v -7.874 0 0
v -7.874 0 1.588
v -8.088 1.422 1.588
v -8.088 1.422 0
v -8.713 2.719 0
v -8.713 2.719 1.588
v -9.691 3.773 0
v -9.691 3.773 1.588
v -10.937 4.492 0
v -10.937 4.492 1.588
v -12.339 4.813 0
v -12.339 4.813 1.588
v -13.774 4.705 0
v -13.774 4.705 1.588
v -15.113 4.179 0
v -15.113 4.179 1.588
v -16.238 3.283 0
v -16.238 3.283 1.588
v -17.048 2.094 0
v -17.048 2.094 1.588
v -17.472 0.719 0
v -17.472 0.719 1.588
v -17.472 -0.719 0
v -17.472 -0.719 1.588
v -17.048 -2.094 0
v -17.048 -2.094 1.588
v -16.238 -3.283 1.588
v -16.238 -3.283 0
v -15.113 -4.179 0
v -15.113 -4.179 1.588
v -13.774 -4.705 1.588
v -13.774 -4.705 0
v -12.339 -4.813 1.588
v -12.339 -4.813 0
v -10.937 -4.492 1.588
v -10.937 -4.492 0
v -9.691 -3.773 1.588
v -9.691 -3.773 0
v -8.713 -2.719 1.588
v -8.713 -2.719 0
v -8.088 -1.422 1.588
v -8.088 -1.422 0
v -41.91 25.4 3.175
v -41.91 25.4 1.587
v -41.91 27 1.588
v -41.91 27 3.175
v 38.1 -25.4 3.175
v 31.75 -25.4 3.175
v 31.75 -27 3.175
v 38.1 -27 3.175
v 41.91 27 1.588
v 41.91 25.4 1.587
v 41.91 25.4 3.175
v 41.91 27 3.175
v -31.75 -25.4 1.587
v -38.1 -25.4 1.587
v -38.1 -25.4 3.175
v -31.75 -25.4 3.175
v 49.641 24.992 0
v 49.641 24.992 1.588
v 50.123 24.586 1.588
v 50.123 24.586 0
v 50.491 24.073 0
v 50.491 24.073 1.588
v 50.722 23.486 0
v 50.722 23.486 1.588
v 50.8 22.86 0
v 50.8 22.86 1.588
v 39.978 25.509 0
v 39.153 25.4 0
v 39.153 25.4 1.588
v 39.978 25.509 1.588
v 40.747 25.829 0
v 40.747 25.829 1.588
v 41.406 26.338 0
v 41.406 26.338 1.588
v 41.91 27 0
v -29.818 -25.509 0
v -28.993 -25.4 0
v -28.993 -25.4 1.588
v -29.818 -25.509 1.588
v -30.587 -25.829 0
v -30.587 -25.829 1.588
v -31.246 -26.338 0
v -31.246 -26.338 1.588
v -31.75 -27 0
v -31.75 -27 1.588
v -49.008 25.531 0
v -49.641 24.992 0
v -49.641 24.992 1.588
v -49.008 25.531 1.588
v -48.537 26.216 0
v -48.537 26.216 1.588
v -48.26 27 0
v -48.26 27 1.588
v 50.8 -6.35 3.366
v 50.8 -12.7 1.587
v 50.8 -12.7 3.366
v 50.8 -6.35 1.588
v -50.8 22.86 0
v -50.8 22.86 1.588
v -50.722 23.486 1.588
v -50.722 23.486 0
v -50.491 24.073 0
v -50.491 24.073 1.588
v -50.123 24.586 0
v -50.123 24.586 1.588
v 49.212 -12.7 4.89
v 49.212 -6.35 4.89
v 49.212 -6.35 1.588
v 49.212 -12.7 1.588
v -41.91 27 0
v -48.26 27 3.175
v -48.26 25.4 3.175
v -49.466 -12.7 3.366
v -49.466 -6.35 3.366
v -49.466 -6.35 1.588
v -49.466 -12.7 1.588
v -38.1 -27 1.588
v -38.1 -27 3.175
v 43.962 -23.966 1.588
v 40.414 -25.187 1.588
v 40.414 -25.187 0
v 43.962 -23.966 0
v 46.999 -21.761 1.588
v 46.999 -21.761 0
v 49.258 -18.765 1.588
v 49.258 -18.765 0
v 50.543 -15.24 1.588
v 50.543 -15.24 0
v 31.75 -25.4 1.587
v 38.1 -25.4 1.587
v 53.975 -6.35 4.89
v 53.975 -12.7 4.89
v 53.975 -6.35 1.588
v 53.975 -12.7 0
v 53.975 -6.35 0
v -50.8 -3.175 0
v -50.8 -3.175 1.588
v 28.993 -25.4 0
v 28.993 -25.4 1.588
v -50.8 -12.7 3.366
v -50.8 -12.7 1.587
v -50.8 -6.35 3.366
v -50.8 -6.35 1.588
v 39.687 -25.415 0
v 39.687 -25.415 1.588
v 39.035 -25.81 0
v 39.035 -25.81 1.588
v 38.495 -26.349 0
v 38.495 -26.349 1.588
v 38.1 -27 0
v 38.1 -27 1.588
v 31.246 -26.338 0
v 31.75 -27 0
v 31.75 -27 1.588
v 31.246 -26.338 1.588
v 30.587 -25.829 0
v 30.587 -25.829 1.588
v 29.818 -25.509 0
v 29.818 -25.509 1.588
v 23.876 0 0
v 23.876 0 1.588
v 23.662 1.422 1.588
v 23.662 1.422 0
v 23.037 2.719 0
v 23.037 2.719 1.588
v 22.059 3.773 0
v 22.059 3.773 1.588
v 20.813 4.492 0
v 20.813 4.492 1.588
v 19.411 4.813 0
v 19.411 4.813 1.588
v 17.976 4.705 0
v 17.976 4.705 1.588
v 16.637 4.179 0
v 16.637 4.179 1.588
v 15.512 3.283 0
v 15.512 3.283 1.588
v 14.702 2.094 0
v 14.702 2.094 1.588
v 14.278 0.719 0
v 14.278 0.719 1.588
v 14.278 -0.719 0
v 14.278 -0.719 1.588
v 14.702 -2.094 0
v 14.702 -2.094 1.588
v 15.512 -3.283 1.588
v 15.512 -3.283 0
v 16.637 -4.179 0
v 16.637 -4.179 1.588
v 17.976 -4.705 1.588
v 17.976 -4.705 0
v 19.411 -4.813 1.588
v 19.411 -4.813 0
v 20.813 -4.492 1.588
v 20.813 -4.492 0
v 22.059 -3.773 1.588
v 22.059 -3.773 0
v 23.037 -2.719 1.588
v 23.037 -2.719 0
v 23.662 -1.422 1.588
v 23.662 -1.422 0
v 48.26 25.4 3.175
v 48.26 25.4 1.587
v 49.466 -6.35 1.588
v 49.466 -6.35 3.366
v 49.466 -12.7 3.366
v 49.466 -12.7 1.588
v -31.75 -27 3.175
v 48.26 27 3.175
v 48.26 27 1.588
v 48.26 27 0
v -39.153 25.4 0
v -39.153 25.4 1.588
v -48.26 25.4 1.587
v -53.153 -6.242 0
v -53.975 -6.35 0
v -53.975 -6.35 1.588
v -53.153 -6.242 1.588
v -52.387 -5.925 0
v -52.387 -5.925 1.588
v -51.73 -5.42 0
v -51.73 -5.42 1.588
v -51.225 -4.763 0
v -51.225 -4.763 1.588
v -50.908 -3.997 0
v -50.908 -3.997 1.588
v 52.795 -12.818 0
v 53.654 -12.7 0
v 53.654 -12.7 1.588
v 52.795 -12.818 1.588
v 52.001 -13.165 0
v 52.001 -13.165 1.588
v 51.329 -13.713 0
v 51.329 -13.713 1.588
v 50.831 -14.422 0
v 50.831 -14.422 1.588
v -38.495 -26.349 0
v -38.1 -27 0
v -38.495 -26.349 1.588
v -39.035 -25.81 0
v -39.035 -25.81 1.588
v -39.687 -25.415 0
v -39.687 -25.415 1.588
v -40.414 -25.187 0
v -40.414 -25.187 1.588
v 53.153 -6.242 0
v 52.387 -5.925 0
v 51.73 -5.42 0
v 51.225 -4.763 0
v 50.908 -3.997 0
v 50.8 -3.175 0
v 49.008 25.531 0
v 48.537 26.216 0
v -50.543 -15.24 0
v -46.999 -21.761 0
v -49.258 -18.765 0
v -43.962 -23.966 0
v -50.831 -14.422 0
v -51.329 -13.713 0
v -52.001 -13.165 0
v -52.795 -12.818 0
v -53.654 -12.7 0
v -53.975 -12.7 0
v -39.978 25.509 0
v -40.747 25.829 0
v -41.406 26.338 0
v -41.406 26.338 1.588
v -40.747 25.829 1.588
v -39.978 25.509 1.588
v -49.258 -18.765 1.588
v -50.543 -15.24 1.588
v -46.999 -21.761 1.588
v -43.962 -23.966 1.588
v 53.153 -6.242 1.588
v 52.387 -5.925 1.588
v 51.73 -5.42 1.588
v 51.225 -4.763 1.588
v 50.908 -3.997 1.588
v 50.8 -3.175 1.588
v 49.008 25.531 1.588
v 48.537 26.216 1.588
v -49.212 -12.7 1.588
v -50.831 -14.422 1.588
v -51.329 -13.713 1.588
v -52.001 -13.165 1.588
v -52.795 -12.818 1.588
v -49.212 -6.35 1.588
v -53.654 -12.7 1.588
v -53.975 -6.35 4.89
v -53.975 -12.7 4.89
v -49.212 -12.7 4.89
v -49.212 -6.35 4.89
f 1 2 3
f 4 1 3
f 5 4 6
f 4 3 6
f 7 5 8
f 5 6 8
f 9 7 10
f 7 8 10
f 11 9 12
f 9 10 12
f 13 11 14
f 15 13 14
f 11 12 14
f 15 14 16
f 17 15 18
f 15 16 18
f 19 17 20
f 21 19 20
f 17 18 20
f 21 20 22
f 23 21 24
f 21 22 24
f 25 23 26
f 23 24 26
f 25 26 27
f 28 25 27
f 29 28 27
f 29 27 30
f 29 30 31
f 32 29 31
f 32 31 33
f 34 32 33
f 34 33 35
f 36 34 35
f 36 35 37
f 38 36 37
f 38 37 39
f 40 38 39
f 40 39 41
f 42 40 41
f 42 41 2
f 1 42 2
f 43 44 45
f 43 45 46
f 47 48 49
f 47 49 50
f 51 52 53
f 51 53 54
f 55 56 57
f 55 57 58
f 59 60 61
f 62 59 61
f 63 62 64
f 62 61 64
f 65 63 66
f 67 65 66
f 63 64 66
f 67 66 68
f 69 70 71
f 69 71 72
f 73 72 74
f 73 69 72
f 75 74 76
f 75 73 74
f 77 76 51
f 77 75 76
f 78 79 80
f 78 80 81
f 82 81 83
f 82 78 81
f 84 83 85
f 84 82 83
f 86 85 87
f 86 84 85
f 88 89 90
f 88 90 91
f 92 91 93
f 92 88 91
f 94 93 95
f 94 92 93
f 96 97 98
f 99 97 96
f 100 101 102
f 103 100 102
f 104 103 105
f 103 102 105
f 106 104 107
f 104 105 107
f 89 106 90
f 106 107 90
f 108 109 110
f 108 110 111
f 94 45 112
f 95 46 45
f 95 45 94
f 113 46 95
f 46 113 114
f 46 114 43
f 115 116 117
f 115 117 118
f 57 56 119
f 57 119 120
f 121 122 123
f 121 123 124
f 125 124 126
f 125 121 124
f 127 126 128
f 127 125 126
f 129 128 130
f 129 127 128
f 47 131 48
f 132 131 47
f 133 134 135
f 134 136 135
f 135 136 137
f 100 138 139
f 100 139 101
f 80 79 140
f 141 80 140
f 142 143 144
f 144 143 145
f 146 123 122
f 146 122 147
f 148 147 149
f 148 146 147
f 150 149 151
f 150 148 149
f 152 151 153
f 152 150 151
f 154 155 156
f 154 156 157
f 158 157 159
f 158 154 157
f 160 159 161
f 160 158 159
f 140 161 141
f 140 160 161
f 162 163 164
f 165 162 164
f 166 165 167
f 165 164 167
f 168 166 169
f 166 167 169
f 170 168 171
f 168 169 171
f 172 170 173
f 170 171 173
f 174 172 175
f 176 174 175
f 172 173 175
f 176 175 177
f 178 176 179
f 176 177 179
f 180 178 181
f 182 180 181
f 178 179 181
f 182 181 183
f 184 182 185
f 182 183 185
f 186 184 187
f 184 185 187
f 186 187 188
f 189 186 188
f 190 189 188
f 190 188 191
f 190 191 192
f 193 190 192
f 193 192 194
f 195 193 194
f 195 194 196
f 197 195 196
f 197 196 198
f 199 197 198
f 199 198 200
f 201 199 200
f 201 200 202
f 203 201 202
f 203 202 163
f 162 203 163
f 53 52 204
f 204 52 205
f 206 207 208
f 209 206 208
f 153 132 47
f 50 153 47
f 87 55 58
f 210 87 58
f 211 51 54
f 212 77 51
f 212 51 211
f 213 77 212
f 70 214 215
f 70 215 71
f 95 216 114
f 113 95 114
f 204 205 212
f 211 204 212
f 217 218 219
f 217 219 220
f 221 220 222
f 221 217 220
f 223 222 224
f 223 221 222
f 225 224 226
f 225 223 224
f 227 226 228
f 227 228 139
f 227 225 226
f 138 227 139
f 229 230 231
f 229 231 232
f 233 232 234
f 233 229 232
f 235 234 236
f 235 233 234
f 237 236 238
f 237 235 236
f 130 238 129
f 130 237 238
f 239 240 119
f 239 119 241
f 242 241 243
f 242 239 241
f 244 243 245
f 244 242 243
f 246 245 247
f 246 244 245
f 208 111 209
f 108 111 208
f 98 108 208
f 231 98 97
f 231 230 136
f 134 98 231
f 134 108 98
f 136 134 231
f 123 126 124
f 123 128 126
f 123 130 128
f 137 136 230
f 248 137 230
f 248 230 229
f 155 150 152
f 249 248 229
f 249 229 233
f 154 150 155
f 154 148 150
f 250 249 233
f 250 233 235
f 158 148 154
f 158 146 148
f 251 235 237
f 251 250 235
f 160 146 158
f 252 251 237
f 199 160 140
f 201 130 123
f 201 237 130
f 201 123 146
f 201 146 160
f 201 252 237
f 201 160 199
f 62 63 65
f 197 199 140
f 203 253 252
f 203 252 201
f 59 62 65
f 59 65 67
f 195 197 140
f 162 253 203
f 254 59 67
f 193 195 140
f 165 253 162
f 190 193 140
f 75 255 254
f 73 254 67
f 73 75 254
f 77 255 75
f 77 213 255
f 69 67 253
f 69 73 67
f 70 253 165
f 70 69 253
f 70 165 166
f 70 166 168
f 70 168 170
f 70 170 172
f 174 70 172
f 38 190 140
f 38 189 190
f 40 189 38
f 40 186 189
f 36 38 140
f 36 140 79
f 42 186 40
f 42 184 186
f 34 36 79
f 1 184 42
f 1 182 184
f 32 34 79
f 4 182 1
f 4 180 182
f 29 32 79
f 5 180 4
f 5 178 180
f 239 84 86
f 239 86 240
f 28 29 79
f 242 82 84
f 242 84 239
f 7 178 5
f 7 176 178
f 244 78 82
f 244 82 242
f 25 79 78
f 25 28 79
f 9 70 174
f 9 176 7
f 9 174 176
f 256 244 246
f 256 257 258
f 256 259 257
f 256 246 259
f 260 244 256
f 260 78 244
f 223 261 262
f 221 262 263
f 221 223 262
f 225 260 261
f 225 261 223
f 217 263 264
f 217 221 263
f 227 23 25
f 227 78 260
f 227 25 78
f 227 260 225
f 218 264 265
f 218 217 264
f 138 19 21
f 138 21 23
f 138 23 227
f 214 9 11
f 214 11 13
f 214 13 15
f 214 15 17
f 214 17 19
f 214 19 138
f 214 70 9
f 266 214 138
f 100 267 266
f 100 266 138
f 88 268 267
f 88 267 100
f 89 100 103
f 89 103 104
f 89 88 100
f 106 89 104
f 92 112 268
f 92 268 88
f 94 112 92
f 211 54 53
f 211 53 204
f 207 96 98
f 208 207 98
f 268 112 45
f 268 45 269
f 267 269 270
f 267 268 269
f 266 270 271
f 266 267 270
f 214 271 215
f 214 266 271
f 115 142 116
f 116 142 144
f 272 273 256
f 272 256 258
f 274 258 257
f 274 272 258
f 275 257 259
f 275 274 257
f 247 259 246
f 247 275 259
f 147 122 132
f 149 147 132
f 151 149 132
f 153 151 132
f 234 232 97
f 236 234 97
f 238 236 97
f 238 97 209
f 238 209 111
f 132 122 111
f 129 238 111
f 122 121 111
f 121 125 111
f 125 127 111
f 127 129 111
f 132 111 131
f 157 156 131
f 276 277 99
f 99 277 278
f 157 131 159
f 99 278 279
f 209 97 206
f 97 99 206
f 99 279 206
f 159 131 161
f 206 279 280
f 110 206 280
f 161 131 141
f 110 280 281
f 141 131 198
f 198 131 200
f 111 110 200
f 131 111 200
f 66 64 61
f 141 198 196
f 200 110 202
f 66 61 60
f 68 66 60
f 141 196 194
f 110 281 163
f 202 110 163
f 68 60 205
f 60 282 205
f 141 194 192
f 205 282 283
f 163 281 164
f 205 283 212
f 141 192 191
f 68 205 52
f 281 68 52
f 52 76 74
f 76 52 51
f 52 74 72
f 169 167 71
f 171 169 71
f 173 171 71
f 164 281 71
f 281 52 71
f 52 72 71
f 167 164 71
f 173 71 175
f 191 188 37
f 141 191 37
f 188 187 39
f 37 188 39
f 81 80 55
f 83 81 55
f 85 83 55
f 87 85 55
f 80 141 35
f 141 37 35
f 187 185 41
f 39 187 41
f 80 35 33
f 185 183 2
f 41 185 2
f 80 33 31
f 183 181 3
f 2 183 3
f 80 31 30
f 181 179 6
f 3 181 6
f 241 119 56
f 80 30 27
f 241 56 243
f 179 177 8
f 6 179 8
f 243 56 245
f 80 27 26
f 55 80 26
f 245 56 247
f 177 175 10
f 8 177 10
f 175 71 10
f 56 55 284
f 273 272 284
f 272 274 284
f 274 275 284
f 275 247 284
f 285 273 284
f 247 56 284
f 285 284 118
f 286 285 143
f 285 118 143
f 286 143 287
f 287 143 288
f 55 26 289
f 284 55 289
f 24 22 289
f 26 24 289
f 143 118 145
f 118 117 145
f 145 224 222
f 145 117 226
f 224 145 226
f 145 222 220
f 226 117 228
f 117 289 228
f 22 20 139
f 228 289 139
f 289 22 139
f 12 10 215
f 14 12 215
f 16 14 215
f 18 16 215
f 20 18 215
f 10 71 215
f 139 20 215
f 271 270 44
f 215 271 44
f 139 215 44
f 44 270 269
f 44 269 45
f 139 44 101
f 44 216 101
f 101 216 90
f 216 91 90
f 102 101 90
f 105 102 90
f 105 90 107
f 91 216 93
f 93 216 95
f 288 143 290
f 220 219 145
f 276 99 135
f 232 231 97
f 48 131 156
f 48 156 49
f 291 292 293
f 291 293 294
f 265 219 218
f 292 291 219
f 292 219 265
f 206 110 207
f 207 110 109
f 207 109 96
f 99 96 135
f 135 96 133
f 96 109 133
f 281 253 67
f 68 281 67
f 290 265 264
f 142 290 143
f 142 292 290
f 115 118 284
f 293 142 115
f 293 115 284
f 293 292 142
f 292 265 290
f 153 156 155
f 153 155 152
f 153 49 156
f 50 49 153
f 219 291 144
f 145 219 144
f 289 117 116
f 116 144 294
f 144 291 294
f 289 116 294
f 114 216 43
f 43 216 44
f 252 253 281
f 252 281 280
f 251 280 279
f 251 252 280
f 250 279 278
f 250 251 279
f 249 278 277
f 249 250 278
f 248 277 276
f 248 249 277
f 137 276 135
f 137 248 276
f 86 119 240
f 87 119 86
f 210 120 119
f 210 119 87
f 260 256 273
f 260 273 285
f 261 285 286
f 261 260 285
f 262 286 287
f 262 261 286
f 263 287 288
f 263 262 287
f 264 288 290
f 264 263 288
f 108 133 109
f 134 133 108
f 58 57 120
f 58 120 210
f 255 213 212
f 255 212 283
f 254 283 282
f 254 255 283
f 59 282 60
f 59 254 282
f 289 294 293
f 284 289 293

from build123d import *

# Parameters (mm, degrees)
F0_W         = 101.6
F0_H         = 50.8
F0_R         = 1.905
F1_DEPTH     = 1.5875
F3_R         = 12.7
F4_R         = 2.54
F2_R         = 4.826
F2_R_2       = 1.905
F5_DEPTH     = 3.175
F6_W         = 6.35
F6_H         = 1.5875
F7_DEPTH     = 1.6002
F8_W         = 6.35
F8_H         = 1.5875
F9_DEPTH     = 1.6002
F10_W        = 6.35
F10_H        = 1.5875
F11_DEPTH    = 3.175
F12_W        = 6.35
F12_H        = 1.5875
F13_DEPTH    = 3.175
F14_W        = 6.35
F14_H        = 1.6002
F15_DEPTH    = 1.5875
F14_W_2      = 3.175
F14_H_2      = 6.35
F16_DEPTH    = 3.302
F17_W        = 6.35
F17_H        = 1.524
F18_DEPTH    = 1.5875
F19_W        = 6.35
F19_H        = 1.524
F20_DEPTH    = 1.5875
F21_T1_DEPTH = 1.5875
F22_W        = 0.254
F22_H        = 6.35
F23_DEPTH    = 2.032
F24_W        = 0.254
F24_H        = 6.35
F25_DEPTH    = 2.032


# Not quite as in the source:
# - a fillet or chamfer that OpenCascade refuses, or shapes differently, is made with other operations: its cross-section is extruded or revolved along the edge and cut away or added


with BuildPart() as f1:
    # F0 (on Top) → F1 (new body)
    with BuildSketch(Plane.XY):
        Rectangle(F0_W, F0_H)
        with Locations((-12.7, 0)):
            Circle(F0_R, mode=Mode.SUBTRACT)
        with Locations((19.05, 0)):
            Circle(F0_R, mode=Mode.SUBTRACT)
    extrude(amount=F1_DEPTH)

    # F3
    f3_edges = [f1.edges().sort_by_distance(p)[0] for p in [
        (-50.8, -25.4, 0.79375),
        (50.8, -25.4, 0.79375),
    ]]
    fillet(f3_edges, radius=F3_R)

    # F4
    f4_edges = [f1.edges().sort_by_distance(p)[0] for p in [
        (-50.8, 25.4, 0.79375),
        (50.8, 25.4, 0.79375),
    ]]
    fillet(f4_edges, radius=F4_R)

    # F2 (on face) → F5 (cut)
    with BuildSketch(Plane.XY.offset(1.5875)):
        with Locations((-12.7, 0)):
            Circle(F2_R)
        with Locations((-12.7, 0)):
            Circle(F2_R_2, mode=Mode.SUBTRACT)
        with Locations((19.05, 0)):
            Circle(F2_R)
        with Locations((19.05, 0)):
            Circle(F2_R_2, mode=Mode.SUBTRACT)
    extrude(amount=-F5_DEPTH, mode=Mode.SUBTRACT)

    # F6 (on face) → F7 (join)
    with BuildSketch(Plane(origin=(0, 25.4, 0), x_dir=(-1, 0, 0), z_dir=(0, 1, 0))):
        with Locations((-45.085, 0.79375)):
            Rectangle(F6_W, F6_H)
        with Locations((45.085, 0.79375)):
            Rectangle(F6_W, F6_H)
    extrude(amount=F7_DEPTH)

    # F8 (on face) → F9 (join)
    with BuildSketch(Plane.XZ.offset(25.4)):
        with Locations((34.925, 0.79375)):
            Rectangle(F8_W, F8_H)
        with Locations((-34.925, 0.79375)):
            Rectangle(F8_W, F8_H)
    extrude(amount=F9_DEPTH)

    # F10 (on face) → F11 (join)
    with BuildSketch(Plane(origin=(-50.8, 0, 0), x_dir=(0, -1, 0), z_dir=(-1, 0, 0))):
        with Locations((9.525, 0.79375)):
            Rectangle(F10_W, F10_H)
    extrude(amount=F11_DEPTH)

    # F12 (on face) → F13 (join)
    with BuildSketch(Plane.YZ.offset(50.8)):
        with Locations((-9.525, 0.79375)):
            Rectangle(F12_W, F12_H)
    extrude(amount=F13_DEPTH)

    # F14 (on face) → F15 (join)
    with BuildSketch(Plane.XY.offset(1.5875)):
        with Locations((45.085, 26.2001)):
            Rectangle(F14_W, F14_H)
        with Locations((34.925, -26.2001)):
            Rectangle(F14_W, F14_H)
        with Locations((-34.925, -26.2001)):
            Rectangle(F14_W, F14_H)
        with Locations((-45.085, 26.2001)):
            Rectangle(F14_W, F14_H)
    extrude(amount=F15_DEPTH)

    # F14 (on face) → F16 (join)
    with BuildSketch(Plane.XY.offset(1.5875)):
        with Locations((52.3875, -9.525)):
            Rectangle(F14_W_2, F14_H_2)
        with Locations((-52.3875, -9.525)):
            Rectangle(F14_W_2, F14_H_2)
    extrude(amount=F16_DEPTH)

    # F17 (on face) → F18 (join)
    with BuildSketch(Plane.YZ.offset(-50.8)):
        with Locations((-9.525, 4.1275)):
            Rectangle(F17_W, F17_H)
    extrude(amount=F18_DEPTH)

    # F19 (on face) → F20 (join)
    with BuildSketch(Plane(origin=(50.8, 0, 0), x_dir=(0, -1, 0), z_dir=(-1, 0, 0))):
        with Locations((9.525, 4.1275)):
            Rectangle(F19_W, F19_H)
    extrude(amount=F20_DEPTH)

    # F21: fillet of radius 3.175 on 12 edges, made by hand

    # F21_s2 → F21_t1 (join)
    with BuildSketch(Plane.XY):
        with BuildLine():
            ThreePointArc((-28.9930759967, -25.4), (-30.5869133472, -25.8290379646), (-31.75, -27.0002))
            Line((-31.75, -27.0002), (-31.75, -25.4))
            Line((-31.75, -25.4), (-28.9930759967, -25.4))
        make_face()
        with BuildLine():
            ThreePointArc((-38.1, -27.0002), (-39.0345990401, -25.8098604937), (-40.4140641084, -25.1873979396))
            ThreePointArc((-40.4140641084, -25.1873979396), (-39.2619049374, -25.3467377974), (-38.1, -25.4))
            Line((-38.1, -25.4), (-38.1, -27.0002))
        make_face()
        with BuildLine():
            ThreePointArc((-50.5434078933, -15.24), (-51.6462135525, -13.4156555752), (-53.6542598667, -12.7))
            Line((-53.6542598667, -12.7), (-50.8, -12.7))
            ThreePointArc((-50.8, -12.7), (-50.7356891432, -13.9764638175), (-50.5434078933, -15.24))
        make_face()
        with BuildLine():
            ThreePointArc((-53.975, -6.35), (-51.7299359697, -5.4200640303), (-50.8, -3.175))
            Line((-50.8, -3.175), (-50.8, -6.35))
            Line((-50.8, -6.35), (-53.975, -6.35))
        make_face()
        with BuildLine():
            ThreePointArc((-49.6405789052, 24.9920417178), (-48.7499512331, 25.8583913172), (-48.26, 27.0002))
            Line((-48.26, 27.0002), (-48.26, 25.4))
            ThreePointArc((-48.26, 25.4), (-48.9797965118, 25.2958762246), (-49.6405789052, 24.9920417178))
        make_face()
        with BuildLine():
            ThreePointArc((-41.91, 27.0002), (-40.7469133472, 25.8290379646), (-39.1530759967, 25.4))
            Line((-39.1530759967, 25.4), (-41.91, 25.4))
            Line((-41.91, 25.4), (-41.91, 27.0002))
        make_face()
        with BuildLine():
            ThreePointArc((48.26, 27.0002), (48.7499512331, 25.8583913172), (49.6405789052, 24.9920417178))
            ThreePointArc((49.6405789052, 24.9920417178), (48.9797965118, 25.2958762246), (48.26, 25.4))
            Line((48.26, 25.4), (48.26, 27.0002))
        make_face()
        with BuildLine():
            ThreePointArc((39.1530759967, 25.4), (40.7469133472, 25.8290379646), (41.91, 27.0002))
            Line((41.91, 27.0002), (41.91, 25.4))
            Line((41.91, 25.4), (39.1530759967, 25.4))
        make_face()
        with BuildLine():
            ThreePointArc((50.8, -3.175), (51.7299359697, -5.4200640303), (53.975, -6.35))
            Line((53.975, -6.35), (50.8, -6.35))
            Line((50.8, -6.35), (50.8, -3.175))
        make_face()
        with BuildLine():
            ThreePointArc((53.6542598667, -12.7), (51.6462135525, -13.4156555752), (50.5434078933, -15.24))
            ThreePointArc((50.5434078933, -15.24), (50.7356891432, -13.9764638175), (50.8, -12.7))
            Line((50.8, -12.7), (53.6542598667, -12.7))
        make_face()
        with BuildLine():
            ThreePointArc((40.4140641084, -25.1873979396), (39.0345990401, -25.8098604937), (38.1, -27.0002))
            Line((38.1, -27.0002), (38.1, -25.4))
            ThreePointArc((38.1, -25.4), (39.2619049374, -25.3467377974), (40.4140641084, -25.1873979396))
        make_face()
        with BuildLine():
            ThreePointArc((31.75, -27.0002), (30.5869133472, -25.8290379646), (28.9930759967, -25.4))
            Line((28.9930759967, -25.4), (31.75, -25.4))
            Line((31.75, -25.4), (31.75, -27.0002))
        make_face()
    extrude(amount=F21_T1_DEPTH)

    # F22 (on face) → F23 (join)
    with BuildSketch(Plane(origin=(0, 0, 3.3655), x_dir=(1, 0, 0), z_dir=(0, 0, -1))):
        with Locations((49.3395, 9.525)):
            Rectangle(F22_W, F22_H)
    extrude(amount=F23_DEPTH)

    # F24 (on face) → F25 (join)
    with BuildSketch(Plane(origin=(0, 0, 3.3655), x_dir=(1, 0, 0), z_dir=(0, 0, -1))):
        with Locations((-49.3395, 9.525)):
            Rectangle(F24_W, F24_H)
    extrude(amount=F25_DEPTH)


solid = f1.part
